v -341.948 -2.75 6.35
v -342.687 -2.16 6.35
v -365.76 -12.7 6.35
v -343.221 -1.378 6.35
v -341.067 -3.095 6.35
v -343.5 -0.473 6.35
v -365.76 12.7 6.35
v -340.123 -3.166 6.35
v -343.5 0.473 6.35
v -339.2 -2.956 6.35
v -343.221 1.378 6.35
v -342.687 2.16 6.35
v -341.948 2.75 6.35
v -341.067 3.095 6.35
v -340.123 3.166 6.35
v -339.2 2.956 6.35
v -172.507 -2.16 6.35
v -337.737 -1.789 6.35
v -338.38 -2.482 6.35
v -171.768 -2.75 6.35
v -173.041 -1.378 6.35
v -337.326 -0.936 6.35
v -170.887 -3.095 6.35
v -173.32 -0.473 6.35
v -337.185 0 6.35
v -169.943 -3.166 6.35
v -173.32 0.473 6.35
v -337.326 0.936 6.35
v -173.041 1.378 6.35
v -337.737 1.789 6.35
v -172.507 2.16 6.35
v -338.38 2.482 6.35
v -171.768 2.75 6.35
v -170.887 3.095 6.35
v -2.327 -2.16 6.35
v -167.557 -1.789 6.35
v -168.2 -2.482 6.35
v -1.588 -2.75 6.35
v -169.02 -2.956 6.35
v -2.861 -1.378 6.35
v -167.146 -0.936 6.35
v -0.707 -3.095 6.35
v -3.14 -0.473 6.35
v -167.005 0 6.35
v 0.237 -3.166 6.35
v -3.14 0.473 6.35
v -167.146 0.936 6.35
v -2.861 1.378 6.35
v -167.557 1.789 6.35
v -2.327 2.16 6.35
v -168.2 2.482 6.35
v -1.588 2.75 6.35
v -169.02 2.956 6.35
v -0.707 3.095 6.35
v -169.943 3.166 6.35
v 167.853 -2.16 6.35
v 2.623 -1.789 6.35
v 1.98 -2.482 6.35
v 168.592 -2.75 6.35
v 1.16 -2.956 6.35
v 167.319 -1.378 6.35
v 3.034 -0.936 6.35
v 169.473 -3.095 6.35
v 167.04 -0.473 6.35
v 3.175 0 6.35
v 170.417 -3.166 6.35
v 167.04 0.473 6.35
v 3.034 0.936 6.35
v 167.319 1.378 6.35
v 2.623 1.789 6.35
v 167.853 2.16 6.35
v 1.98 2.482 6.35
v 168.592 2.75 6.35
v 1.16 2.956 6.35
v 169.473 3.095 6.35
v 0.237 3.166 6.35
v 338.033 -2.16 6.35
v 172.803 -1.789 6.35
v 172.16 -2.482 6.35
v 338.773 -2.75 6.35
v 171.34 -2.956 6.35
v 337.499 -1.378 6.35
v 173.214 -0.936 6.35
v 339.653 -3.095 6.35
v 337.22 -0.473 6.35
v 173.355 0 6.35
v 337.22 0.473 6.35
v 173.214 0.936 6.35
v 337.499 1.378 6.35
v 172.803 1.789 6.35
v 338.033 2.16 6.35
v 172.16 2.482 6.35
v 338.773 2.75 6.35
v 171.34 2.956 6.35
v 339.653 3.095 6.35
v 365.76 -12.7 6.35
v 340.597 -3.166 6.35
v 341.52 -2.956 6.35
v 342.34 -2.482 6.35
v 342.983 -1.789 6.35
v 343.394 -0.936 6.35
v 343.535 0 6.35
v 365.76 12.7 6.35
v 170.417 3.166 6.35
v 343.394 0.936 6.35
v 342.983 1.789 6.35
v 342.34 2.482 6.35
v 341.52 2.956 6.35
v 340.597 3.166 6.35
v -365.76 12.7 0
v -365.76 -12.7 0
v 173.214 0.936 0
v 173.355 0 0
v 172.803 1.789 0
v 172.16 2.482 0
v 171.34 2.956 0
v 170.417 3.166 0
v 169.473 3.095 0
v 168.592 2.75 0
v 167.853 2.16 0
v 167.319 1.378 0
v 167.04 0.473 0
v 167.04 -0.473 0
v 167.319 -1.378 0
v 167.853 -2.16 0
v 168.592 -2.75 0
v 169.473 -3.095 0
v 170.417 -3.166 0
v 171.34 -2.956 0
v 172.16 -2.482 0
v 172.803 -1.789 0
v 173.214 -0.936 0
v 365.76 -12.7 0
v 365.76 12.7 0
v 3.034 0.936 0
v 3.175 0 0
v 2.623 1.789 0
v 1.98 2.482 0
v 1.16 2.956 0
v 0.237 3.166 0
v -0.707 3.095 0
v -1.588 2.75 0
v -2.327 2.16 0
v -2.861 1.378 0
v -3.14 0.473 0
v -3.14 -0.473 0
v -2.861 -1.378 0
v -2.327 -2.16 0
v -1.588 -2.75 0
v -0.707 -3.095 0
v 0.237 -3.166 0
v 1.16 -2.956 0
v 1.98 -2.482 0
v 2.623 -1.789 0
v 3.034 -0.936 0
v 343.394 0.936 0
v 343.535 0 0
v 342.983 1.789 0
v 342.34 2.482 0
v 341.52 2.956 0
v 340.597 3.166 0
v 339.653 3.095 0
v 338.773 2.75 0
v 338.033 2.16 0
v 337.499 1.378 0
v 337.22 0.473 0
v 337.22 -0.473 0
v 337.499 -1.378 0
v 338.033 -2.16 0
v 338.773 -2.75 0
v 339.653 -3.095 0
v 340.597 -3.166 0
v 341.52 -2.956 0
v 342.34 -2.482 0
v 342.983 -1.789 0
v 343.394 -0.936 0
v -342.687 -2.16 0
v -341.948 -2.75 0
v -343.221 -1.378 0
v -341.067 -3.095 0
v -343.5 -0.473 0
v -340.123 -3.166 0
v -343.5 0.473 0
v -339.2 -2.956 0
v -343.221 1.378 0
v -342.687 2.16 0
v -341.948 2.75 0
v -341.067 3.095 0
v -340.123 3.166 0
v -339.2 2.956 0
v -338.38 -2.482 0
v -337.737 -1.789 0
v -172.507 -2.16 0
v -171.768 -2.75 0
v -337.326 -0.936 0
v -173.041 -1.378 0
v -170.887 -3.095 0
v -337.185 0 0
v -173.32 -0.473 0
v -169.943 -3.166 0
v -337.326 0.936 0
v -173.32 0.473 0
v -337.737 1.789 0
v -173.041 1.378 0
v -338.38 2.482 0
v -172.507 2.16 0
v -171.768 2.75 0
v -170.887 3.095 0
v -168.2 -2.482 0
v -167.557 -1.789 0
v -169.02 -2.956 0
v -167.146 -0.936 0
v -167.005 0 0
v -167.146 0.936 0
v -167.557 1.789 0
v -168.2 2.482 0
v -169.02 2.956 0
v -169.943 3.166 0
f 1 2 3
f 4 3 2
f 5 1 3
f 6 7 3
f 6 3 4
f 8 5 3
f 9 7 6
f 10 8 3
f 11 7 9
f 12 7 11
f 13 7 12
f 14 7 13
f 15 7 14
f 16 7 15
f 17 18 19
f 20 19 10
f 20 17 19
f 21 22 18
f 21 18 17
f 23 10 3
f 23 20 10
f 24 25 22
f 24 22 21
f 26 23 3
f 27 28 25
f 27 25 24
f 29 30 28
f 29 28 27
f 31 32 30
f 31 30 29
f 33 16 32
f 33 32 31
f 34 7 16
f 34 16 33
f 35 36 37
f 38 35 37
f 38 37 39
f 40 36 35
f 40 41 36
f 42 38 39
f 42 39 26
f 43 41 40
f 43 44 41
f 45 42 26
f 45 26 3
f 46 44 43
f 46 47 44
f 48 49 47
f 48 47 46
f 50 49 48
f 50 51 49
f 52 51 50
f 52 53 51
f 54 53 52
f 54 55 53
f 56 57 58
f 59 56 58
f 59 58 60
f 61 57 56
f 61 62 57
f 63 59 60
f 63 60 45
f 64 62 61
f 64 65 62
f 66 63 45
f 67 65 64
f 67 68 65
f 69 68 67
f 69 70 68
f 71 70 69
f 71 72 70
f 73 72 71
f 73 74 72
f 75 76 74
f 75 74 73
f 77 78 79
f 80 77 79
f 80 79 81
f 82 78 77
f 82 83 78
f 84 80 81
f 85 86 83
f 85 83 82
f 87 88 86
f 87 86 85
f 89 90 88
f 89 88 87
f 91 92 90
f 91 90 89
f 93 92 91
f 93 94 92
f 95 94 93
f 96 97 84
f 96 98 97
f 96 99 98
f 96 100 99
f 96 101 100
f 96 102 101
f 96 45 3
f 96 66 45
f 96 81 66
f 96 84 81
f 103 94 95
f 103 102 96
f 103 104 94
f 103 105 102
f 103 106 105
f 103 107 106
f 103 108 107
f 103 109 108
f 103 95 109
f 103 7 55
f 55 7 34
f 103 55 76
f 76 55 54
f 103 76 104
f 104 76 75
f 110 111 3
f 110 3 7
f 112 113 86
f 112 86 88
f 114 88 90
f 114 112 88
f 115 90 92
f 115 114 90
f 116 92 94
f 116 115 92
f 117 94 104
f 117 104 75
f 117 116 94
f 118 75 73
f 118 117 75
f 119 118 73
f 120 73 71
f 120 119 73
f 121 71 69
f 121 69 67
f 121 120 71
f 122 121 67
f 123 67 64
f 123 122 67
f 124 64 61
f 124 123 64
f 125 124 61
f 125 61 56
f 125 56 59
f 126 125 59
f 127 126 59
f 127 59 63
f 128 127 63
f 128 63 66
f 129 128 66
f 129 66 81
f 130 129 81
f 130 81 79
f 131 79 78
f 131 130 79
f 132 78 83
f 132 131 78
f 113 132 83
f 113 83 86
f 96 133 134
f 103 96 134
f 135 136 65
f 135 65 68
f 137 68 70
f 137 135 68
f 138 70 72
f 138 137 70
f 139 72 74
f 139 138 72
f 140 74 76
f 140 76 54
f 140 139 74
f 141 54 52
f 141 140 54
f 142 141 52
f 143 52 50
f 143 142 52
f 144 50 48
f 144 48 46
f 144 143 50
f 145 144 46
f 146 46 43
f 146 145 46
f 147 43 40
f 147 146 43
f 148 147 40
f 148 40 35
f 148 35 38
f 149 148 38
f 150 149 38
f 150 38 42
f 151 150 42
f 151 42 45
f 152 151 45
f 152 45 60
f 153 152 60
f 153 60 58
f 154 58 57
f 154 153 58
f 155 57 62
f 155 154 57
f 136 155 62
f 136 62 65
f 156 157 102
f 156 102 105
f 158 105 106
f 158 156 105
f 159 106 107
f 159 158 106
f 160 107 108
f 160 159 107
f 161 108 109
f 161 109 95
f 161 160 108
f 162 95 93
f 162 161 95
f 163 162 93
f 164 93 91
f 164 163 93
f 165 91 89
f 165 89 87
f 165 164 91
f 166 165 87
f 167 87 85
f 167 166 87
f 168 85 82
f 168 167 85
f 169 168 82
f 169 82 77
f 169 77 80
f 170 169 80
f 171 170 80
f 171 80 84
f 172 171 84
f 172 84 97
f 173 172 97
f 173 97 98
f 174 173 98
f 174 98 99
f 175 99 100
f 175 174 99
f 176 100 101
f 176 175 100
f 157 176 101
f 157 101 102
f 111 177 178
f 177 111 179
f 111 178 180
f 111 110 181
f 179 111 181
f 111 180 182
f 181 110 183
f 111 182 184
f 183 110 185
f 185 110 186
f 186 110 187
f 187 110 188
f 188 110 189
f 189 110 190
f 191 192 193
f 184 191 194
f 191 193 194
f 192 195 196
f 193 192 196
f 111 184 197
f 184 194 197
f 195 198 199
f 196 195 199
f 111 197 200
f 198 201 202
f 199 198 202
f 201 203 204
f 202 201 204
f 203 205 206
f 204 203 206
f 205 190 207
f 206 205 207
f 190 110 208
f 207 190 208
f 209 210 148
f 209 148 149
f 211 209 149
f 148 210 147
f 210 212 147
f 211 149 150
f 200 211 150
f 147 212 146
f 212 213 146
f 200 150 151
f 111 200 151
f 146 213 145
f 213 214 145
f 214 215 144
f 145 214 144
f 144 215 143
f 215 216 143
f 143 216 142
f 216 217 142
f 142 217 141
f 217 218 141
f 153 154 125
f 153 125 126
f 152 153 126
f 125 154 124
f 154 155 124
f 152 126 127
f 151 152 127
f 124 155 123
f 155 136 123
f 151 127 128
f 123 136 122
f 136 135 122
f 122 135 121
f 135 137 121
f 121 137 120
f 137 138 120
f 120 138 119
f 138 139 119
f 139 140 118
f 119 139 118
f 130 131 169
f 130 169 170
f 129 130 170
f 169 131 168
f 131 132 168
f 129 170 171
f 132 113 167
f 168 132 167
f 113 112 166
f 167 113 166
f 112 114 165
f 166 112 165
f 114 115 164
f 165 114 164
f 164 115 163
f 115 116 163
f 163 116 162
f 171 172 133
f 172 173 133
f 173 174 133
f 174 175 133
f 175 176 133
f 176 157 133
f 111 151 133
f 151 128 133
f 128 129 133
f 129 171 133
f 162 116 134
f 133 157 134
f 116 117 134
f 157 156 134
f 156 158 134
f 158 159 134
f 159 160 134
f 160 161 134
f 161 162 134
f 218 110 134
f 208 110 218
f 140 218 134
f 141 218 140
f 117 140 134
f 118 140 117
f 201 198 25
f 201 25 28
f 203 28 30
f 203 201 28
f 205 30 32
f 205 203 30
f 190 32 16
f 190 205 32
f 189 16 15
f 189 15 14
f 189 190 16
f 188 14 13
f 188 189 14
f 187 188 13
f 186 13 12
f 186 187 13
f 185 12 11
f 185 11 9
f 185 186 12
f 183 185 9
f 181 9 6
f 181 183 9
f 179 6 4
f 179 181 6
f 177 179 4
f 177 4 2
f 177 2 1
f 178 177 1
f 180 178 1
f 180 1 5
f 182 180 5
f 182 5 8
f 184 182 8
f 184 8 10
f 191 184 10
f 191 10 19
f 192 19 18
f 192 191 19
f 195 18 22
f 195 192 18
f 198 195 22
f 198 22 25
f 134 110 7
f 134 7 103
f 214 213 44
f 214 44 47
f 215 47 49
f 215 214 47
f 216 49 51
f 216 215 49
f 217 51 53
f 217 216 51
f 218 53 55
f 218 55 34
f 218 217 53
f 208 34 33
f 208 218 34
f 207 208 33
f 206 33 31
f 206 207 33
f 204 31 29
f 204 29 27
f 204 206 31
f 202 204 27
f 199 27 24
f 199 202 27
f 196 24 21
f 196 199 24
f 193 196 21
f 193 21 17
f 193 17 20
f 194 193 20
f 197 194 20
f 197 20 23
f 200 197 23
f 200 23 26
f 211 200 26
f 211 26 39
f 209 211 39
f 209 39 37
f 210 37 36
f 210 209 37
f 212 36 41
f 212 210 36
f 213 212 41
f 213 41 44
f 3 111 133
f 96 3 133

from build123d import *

# Parameters (mm, degrees)
F0_W     = 731.52
F0_H     = 25.4
F0_R     = 3.175
F1_DEPTH = 6.35


with BuildPart() as f1:
    # F0 (on Top) → F1 (new body)
    with BuildSketch(Plane.XY):
        Rectangle(F0_W, F0_H)
        with Locations((-340.36, 0)):
            Circle(F0_R, mode=Mode.SUBTRACT)
        with Locations((-170.18, 0)):
            Circle(F0_R, mode=Mode.SUBTRACT)
        Circle(F0_R, mode=Mode.SUBTRACT)
        with Locations((170.18, 0)):
            Circle(F0_R, mode=Mode.SUBTRACT)
        with Locations((340.36, 0)):
            Circle(F0_R, mode=Mode.SUBTRACT)
    extrude(amount=F1_DEPTH)


solid = f1.part
